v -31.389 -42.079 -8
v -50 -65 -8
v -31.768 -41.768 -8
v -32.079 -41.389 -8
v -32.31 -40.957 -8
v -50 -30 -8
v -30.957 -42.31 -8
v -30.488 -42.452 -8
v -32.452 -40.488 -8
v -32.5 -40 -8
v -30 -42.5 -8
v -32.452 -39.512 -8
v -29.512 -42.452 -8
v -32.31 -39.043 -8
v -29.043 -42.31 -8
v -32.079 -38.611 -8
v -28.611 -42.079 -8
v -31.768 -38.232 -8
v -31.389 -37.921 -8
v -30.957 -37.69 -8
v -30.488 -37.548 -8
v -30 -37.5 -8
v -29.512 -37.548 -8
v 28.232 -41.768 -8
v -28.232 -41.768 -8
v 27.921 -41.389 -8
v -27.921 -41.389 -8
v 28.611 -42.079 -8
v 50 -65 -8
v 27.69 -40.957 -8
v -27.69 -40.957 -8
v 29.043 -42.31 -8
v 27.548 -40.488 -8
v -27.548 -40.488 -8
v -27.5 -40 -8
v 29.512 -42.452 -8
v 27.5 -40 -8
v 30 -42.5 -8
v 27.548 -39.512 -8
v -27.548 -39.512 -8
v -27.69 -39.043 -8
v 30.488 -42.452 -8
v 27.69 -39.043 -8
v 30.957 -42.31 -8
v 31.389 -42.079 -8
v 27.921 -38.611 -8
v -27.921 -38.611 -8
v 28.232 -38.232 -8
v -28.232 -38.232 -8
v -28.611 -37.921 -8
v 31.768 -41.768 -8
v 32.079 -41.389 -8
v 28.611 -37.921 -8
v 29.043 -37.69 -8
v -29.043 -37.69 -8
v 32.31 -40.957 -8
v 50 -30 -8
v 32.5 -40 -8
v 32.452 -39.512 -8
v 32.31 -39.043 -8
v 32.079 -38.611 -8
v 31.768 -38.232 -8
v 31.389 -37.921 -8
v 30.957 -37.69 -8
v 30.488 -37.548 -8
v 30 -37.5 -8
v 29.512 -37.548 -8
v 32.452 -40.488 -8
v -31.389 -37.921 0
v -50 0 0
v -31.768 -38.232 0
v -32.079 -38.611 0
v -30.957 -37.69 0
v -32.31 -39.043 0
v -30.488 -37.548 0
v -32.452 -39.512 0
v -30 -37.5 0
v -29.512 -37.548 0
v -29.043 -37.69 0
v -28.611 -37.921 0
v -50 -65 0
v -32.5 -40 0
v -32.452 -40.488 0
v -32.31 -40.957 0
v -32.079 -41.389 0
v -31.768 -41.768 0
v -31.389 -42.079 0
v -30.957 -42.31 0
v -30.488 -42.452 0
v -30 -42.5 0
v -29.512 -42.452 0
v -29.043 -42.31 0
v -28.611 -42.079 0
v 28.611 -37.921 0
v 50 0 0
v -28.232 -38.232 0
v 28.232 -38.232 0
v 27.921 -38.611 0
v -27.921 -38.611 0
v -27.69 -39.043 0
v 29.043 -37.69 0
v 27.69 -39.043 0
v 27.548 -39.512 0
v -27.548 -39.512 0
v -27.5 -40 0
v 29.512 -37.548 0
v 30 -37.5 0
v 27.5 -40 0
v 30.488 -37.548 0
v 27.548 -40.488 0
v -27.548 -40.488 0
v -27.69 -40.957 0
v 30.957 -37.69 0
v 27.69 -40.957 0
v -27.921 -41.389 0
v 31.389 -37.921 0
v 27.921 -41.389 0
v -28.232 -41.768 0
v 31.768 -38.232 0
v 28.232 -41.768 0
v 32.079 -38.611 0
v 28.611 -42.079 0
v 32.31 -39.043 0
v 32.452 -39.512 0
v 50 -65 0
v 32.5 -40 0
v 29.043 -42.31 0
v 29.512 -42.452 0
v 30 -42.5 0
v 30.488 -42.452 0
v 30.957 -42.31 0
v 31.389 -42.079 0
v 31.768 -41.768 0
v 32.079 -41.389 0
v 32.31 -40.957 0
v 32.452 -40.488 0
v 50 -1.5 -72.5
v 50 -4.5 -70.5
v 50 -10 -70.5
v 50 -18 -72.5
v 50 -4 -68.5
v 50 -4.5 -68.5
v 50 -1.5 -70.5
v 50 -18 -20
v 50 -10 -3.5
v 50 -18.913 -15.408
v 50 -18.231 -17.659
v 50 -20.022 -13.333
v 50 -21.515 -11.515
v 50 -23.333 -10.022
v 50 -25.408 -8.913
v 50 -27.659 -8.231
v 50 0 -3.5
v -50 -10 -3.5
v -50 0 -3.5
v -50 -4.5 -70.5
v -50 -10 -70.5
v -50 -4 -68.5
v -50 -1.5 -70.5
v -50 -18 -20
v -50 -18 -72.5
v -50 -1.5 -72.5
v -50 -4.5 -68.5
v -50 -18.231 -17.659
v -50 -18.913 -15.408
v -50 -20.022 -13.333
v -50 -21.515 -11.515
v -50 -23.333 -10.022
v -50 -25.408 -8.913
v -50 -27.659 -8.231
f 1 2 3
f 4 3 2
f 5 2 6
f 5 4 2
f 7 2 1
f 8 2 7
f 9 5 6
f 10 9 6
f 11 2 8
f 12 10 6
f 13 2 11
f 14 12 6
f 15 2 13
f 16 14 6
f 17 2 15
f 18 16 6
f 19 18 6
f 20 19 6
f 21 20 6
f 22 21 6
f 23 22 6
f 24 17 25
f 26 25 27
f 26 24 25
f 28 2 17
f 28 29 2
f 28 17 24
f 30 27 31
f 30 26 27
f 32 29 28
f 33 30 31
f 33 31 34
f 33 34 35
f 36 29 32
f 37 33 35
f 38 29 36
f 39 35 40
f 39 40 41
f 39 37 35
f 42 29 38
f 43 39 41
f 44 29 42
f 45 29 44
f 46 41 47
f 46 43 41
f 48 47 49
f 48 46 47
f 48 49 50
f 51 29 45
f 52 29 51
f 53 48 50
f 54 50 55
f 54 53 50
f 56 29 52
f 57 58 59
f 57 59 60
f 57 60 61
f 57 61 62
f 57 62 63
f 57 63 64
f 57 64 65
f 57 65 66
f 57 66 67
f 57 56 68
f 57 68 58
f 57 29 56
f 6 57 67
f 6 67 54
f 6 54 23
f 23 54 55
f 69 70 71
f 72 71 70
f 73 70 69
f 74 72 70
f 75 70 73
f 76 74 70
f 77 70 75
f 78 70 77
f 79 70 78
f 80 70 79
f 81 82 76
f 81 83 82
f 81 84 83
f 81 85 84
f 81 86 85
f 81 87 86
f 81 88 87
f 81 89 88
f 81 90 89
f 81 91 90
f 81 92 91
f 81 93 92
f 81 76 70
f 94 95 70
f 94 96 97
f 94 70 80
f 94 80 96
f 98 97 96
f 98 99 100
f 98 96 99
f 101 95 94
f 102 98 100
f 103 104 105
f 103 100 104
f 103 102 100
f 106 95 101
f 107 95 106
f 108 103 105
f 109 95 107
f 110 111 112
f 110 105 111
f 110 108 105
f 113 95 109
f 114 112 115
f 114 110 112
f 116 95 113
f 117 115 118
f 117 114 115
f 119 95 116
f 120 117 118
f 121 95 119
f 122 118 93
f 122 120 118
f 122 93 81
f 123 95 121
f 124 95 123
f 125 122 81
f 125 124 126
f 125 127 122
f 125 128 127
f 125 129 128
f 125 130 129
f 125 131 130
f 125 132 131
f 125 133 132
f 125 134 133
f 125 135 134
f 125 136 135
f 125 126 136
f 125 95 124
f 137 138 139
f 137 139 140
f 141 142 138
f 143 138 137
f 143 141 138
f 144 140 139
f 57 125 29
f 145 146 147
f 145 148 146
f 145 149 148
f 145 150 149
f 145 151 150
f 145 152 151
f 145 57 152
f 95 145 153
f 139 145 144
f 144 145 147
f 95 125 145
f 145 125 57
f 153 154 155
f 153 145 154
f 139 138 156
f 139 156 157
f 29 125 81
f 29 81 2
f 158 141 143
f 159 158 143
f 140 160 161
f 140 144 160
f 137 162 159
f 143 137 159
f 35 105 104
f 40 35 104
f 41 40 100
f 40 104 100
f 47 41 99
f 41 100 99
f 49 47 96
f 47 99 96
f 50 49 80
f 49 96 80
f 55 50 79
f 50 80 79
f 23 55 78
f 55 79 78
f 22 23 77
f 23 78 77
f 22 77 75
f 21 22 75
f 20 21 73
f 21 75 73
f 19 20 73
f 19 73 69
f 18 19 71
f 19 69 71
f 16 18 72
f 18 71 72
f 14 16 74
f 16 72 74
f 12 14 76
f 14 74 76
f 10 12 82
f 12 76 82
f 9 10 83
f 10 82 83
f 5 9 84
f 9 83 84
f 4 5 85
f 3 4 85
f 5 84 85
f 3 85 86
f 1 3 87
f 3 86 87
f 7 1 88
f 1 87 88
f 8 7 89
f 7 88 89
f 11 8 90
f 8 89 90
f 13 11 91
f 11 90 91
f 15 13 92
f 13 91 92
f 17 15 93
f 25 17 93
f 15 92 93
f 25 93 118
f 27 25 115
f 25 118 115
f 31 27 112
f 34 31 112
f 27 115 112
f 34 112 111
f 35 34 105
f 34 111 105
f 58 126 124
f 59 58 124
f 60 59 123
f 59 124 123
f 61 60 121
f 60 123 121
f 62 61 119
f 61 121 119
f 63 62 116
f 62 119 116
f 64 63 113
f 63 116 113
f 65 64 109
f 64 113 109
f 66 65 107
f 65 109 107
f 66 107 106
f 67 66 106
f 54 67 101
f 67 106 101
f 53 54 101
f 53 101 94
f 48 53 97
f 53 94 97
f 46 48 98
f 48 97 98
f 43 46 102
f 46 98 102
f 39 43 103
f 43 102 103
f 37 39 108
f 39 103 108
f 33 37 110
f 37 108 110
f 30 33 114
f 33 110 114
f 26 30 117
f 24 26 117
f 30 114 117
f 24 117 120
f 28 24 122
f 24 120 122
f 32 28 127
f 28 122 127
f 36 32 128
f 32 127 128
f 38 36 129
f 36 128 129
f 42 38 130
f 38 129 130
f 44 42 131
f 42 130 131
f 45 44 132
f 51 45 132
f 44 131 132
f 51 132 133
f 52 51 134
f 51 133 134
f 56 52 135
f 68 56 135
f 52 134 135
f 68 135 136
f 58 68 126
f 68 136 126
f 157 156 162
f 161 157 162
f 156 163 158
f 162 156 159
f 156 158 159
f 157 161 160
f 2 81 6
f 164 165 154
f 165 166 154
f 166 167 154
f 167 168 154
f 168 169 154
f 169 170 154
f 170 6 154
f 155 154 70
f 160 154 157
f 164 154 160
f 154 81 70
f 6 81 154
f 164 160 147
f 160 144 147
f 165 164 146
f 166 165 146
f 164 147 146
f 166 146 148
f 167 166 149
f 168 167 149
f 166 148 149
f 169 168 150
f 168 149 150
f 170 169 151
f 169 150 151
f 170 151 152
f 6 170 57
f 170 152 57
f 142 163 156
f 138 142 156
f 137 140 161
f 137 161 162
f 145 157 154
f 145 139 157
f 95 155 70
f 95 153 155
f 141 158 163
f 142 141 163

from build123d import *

# Parameters (mm, degrees)
F1_DEPTH = 50
F3_DEPTH = 100
F4_R     = 2.5
F5_DEPTH = 8
F6_R     = 12


with BuildPart() as f1:
    # F0 (on Right) → F1 (new body, symmetric)
    with BuildSketch(Plane.YZ):
        Polygon((0, -3.5), (0, 0), (-65, 0), (-65, -8), (-18, -8), (-18, -72.5), (-1.5, -72.5), (-1.5, -68.5), (-4.5, -68.5), (-4.5, -70.5), (-10, -70.5), (-10, -3.5), align=None)
    extrude(amount=F1_DEPTH, both=True)

    # F2 (on face) → F3 (cut, through all)
    with BuildSketch(Plane.YZ.offset(50)):
        Polygon((-1.5, -68.5), (-4, -68.5), (-1.5, -70.5), align=None)
    extrude(amount=-F3_DEPTH, mode=Mode.SUBTRACT)

    # F4 (on face) → F5 (cut, through all)
    with BuildSketch(Plane.XY):
        with Locations((-30, -40)):
            Circle(F4_R)
        with Locations((30, -40)):
            Circle(F4_R)
    extrude(amount=-F5_DEPTH, mode=Mode.SUBTRACT)

    # F6
    f6_edges = [f1.edges().sort_by_distance(p)[0] for p in [
        (0, -18, -8),
    ]]
    fillet(f6_edges, radius=F6_R)


solid = f1.part
